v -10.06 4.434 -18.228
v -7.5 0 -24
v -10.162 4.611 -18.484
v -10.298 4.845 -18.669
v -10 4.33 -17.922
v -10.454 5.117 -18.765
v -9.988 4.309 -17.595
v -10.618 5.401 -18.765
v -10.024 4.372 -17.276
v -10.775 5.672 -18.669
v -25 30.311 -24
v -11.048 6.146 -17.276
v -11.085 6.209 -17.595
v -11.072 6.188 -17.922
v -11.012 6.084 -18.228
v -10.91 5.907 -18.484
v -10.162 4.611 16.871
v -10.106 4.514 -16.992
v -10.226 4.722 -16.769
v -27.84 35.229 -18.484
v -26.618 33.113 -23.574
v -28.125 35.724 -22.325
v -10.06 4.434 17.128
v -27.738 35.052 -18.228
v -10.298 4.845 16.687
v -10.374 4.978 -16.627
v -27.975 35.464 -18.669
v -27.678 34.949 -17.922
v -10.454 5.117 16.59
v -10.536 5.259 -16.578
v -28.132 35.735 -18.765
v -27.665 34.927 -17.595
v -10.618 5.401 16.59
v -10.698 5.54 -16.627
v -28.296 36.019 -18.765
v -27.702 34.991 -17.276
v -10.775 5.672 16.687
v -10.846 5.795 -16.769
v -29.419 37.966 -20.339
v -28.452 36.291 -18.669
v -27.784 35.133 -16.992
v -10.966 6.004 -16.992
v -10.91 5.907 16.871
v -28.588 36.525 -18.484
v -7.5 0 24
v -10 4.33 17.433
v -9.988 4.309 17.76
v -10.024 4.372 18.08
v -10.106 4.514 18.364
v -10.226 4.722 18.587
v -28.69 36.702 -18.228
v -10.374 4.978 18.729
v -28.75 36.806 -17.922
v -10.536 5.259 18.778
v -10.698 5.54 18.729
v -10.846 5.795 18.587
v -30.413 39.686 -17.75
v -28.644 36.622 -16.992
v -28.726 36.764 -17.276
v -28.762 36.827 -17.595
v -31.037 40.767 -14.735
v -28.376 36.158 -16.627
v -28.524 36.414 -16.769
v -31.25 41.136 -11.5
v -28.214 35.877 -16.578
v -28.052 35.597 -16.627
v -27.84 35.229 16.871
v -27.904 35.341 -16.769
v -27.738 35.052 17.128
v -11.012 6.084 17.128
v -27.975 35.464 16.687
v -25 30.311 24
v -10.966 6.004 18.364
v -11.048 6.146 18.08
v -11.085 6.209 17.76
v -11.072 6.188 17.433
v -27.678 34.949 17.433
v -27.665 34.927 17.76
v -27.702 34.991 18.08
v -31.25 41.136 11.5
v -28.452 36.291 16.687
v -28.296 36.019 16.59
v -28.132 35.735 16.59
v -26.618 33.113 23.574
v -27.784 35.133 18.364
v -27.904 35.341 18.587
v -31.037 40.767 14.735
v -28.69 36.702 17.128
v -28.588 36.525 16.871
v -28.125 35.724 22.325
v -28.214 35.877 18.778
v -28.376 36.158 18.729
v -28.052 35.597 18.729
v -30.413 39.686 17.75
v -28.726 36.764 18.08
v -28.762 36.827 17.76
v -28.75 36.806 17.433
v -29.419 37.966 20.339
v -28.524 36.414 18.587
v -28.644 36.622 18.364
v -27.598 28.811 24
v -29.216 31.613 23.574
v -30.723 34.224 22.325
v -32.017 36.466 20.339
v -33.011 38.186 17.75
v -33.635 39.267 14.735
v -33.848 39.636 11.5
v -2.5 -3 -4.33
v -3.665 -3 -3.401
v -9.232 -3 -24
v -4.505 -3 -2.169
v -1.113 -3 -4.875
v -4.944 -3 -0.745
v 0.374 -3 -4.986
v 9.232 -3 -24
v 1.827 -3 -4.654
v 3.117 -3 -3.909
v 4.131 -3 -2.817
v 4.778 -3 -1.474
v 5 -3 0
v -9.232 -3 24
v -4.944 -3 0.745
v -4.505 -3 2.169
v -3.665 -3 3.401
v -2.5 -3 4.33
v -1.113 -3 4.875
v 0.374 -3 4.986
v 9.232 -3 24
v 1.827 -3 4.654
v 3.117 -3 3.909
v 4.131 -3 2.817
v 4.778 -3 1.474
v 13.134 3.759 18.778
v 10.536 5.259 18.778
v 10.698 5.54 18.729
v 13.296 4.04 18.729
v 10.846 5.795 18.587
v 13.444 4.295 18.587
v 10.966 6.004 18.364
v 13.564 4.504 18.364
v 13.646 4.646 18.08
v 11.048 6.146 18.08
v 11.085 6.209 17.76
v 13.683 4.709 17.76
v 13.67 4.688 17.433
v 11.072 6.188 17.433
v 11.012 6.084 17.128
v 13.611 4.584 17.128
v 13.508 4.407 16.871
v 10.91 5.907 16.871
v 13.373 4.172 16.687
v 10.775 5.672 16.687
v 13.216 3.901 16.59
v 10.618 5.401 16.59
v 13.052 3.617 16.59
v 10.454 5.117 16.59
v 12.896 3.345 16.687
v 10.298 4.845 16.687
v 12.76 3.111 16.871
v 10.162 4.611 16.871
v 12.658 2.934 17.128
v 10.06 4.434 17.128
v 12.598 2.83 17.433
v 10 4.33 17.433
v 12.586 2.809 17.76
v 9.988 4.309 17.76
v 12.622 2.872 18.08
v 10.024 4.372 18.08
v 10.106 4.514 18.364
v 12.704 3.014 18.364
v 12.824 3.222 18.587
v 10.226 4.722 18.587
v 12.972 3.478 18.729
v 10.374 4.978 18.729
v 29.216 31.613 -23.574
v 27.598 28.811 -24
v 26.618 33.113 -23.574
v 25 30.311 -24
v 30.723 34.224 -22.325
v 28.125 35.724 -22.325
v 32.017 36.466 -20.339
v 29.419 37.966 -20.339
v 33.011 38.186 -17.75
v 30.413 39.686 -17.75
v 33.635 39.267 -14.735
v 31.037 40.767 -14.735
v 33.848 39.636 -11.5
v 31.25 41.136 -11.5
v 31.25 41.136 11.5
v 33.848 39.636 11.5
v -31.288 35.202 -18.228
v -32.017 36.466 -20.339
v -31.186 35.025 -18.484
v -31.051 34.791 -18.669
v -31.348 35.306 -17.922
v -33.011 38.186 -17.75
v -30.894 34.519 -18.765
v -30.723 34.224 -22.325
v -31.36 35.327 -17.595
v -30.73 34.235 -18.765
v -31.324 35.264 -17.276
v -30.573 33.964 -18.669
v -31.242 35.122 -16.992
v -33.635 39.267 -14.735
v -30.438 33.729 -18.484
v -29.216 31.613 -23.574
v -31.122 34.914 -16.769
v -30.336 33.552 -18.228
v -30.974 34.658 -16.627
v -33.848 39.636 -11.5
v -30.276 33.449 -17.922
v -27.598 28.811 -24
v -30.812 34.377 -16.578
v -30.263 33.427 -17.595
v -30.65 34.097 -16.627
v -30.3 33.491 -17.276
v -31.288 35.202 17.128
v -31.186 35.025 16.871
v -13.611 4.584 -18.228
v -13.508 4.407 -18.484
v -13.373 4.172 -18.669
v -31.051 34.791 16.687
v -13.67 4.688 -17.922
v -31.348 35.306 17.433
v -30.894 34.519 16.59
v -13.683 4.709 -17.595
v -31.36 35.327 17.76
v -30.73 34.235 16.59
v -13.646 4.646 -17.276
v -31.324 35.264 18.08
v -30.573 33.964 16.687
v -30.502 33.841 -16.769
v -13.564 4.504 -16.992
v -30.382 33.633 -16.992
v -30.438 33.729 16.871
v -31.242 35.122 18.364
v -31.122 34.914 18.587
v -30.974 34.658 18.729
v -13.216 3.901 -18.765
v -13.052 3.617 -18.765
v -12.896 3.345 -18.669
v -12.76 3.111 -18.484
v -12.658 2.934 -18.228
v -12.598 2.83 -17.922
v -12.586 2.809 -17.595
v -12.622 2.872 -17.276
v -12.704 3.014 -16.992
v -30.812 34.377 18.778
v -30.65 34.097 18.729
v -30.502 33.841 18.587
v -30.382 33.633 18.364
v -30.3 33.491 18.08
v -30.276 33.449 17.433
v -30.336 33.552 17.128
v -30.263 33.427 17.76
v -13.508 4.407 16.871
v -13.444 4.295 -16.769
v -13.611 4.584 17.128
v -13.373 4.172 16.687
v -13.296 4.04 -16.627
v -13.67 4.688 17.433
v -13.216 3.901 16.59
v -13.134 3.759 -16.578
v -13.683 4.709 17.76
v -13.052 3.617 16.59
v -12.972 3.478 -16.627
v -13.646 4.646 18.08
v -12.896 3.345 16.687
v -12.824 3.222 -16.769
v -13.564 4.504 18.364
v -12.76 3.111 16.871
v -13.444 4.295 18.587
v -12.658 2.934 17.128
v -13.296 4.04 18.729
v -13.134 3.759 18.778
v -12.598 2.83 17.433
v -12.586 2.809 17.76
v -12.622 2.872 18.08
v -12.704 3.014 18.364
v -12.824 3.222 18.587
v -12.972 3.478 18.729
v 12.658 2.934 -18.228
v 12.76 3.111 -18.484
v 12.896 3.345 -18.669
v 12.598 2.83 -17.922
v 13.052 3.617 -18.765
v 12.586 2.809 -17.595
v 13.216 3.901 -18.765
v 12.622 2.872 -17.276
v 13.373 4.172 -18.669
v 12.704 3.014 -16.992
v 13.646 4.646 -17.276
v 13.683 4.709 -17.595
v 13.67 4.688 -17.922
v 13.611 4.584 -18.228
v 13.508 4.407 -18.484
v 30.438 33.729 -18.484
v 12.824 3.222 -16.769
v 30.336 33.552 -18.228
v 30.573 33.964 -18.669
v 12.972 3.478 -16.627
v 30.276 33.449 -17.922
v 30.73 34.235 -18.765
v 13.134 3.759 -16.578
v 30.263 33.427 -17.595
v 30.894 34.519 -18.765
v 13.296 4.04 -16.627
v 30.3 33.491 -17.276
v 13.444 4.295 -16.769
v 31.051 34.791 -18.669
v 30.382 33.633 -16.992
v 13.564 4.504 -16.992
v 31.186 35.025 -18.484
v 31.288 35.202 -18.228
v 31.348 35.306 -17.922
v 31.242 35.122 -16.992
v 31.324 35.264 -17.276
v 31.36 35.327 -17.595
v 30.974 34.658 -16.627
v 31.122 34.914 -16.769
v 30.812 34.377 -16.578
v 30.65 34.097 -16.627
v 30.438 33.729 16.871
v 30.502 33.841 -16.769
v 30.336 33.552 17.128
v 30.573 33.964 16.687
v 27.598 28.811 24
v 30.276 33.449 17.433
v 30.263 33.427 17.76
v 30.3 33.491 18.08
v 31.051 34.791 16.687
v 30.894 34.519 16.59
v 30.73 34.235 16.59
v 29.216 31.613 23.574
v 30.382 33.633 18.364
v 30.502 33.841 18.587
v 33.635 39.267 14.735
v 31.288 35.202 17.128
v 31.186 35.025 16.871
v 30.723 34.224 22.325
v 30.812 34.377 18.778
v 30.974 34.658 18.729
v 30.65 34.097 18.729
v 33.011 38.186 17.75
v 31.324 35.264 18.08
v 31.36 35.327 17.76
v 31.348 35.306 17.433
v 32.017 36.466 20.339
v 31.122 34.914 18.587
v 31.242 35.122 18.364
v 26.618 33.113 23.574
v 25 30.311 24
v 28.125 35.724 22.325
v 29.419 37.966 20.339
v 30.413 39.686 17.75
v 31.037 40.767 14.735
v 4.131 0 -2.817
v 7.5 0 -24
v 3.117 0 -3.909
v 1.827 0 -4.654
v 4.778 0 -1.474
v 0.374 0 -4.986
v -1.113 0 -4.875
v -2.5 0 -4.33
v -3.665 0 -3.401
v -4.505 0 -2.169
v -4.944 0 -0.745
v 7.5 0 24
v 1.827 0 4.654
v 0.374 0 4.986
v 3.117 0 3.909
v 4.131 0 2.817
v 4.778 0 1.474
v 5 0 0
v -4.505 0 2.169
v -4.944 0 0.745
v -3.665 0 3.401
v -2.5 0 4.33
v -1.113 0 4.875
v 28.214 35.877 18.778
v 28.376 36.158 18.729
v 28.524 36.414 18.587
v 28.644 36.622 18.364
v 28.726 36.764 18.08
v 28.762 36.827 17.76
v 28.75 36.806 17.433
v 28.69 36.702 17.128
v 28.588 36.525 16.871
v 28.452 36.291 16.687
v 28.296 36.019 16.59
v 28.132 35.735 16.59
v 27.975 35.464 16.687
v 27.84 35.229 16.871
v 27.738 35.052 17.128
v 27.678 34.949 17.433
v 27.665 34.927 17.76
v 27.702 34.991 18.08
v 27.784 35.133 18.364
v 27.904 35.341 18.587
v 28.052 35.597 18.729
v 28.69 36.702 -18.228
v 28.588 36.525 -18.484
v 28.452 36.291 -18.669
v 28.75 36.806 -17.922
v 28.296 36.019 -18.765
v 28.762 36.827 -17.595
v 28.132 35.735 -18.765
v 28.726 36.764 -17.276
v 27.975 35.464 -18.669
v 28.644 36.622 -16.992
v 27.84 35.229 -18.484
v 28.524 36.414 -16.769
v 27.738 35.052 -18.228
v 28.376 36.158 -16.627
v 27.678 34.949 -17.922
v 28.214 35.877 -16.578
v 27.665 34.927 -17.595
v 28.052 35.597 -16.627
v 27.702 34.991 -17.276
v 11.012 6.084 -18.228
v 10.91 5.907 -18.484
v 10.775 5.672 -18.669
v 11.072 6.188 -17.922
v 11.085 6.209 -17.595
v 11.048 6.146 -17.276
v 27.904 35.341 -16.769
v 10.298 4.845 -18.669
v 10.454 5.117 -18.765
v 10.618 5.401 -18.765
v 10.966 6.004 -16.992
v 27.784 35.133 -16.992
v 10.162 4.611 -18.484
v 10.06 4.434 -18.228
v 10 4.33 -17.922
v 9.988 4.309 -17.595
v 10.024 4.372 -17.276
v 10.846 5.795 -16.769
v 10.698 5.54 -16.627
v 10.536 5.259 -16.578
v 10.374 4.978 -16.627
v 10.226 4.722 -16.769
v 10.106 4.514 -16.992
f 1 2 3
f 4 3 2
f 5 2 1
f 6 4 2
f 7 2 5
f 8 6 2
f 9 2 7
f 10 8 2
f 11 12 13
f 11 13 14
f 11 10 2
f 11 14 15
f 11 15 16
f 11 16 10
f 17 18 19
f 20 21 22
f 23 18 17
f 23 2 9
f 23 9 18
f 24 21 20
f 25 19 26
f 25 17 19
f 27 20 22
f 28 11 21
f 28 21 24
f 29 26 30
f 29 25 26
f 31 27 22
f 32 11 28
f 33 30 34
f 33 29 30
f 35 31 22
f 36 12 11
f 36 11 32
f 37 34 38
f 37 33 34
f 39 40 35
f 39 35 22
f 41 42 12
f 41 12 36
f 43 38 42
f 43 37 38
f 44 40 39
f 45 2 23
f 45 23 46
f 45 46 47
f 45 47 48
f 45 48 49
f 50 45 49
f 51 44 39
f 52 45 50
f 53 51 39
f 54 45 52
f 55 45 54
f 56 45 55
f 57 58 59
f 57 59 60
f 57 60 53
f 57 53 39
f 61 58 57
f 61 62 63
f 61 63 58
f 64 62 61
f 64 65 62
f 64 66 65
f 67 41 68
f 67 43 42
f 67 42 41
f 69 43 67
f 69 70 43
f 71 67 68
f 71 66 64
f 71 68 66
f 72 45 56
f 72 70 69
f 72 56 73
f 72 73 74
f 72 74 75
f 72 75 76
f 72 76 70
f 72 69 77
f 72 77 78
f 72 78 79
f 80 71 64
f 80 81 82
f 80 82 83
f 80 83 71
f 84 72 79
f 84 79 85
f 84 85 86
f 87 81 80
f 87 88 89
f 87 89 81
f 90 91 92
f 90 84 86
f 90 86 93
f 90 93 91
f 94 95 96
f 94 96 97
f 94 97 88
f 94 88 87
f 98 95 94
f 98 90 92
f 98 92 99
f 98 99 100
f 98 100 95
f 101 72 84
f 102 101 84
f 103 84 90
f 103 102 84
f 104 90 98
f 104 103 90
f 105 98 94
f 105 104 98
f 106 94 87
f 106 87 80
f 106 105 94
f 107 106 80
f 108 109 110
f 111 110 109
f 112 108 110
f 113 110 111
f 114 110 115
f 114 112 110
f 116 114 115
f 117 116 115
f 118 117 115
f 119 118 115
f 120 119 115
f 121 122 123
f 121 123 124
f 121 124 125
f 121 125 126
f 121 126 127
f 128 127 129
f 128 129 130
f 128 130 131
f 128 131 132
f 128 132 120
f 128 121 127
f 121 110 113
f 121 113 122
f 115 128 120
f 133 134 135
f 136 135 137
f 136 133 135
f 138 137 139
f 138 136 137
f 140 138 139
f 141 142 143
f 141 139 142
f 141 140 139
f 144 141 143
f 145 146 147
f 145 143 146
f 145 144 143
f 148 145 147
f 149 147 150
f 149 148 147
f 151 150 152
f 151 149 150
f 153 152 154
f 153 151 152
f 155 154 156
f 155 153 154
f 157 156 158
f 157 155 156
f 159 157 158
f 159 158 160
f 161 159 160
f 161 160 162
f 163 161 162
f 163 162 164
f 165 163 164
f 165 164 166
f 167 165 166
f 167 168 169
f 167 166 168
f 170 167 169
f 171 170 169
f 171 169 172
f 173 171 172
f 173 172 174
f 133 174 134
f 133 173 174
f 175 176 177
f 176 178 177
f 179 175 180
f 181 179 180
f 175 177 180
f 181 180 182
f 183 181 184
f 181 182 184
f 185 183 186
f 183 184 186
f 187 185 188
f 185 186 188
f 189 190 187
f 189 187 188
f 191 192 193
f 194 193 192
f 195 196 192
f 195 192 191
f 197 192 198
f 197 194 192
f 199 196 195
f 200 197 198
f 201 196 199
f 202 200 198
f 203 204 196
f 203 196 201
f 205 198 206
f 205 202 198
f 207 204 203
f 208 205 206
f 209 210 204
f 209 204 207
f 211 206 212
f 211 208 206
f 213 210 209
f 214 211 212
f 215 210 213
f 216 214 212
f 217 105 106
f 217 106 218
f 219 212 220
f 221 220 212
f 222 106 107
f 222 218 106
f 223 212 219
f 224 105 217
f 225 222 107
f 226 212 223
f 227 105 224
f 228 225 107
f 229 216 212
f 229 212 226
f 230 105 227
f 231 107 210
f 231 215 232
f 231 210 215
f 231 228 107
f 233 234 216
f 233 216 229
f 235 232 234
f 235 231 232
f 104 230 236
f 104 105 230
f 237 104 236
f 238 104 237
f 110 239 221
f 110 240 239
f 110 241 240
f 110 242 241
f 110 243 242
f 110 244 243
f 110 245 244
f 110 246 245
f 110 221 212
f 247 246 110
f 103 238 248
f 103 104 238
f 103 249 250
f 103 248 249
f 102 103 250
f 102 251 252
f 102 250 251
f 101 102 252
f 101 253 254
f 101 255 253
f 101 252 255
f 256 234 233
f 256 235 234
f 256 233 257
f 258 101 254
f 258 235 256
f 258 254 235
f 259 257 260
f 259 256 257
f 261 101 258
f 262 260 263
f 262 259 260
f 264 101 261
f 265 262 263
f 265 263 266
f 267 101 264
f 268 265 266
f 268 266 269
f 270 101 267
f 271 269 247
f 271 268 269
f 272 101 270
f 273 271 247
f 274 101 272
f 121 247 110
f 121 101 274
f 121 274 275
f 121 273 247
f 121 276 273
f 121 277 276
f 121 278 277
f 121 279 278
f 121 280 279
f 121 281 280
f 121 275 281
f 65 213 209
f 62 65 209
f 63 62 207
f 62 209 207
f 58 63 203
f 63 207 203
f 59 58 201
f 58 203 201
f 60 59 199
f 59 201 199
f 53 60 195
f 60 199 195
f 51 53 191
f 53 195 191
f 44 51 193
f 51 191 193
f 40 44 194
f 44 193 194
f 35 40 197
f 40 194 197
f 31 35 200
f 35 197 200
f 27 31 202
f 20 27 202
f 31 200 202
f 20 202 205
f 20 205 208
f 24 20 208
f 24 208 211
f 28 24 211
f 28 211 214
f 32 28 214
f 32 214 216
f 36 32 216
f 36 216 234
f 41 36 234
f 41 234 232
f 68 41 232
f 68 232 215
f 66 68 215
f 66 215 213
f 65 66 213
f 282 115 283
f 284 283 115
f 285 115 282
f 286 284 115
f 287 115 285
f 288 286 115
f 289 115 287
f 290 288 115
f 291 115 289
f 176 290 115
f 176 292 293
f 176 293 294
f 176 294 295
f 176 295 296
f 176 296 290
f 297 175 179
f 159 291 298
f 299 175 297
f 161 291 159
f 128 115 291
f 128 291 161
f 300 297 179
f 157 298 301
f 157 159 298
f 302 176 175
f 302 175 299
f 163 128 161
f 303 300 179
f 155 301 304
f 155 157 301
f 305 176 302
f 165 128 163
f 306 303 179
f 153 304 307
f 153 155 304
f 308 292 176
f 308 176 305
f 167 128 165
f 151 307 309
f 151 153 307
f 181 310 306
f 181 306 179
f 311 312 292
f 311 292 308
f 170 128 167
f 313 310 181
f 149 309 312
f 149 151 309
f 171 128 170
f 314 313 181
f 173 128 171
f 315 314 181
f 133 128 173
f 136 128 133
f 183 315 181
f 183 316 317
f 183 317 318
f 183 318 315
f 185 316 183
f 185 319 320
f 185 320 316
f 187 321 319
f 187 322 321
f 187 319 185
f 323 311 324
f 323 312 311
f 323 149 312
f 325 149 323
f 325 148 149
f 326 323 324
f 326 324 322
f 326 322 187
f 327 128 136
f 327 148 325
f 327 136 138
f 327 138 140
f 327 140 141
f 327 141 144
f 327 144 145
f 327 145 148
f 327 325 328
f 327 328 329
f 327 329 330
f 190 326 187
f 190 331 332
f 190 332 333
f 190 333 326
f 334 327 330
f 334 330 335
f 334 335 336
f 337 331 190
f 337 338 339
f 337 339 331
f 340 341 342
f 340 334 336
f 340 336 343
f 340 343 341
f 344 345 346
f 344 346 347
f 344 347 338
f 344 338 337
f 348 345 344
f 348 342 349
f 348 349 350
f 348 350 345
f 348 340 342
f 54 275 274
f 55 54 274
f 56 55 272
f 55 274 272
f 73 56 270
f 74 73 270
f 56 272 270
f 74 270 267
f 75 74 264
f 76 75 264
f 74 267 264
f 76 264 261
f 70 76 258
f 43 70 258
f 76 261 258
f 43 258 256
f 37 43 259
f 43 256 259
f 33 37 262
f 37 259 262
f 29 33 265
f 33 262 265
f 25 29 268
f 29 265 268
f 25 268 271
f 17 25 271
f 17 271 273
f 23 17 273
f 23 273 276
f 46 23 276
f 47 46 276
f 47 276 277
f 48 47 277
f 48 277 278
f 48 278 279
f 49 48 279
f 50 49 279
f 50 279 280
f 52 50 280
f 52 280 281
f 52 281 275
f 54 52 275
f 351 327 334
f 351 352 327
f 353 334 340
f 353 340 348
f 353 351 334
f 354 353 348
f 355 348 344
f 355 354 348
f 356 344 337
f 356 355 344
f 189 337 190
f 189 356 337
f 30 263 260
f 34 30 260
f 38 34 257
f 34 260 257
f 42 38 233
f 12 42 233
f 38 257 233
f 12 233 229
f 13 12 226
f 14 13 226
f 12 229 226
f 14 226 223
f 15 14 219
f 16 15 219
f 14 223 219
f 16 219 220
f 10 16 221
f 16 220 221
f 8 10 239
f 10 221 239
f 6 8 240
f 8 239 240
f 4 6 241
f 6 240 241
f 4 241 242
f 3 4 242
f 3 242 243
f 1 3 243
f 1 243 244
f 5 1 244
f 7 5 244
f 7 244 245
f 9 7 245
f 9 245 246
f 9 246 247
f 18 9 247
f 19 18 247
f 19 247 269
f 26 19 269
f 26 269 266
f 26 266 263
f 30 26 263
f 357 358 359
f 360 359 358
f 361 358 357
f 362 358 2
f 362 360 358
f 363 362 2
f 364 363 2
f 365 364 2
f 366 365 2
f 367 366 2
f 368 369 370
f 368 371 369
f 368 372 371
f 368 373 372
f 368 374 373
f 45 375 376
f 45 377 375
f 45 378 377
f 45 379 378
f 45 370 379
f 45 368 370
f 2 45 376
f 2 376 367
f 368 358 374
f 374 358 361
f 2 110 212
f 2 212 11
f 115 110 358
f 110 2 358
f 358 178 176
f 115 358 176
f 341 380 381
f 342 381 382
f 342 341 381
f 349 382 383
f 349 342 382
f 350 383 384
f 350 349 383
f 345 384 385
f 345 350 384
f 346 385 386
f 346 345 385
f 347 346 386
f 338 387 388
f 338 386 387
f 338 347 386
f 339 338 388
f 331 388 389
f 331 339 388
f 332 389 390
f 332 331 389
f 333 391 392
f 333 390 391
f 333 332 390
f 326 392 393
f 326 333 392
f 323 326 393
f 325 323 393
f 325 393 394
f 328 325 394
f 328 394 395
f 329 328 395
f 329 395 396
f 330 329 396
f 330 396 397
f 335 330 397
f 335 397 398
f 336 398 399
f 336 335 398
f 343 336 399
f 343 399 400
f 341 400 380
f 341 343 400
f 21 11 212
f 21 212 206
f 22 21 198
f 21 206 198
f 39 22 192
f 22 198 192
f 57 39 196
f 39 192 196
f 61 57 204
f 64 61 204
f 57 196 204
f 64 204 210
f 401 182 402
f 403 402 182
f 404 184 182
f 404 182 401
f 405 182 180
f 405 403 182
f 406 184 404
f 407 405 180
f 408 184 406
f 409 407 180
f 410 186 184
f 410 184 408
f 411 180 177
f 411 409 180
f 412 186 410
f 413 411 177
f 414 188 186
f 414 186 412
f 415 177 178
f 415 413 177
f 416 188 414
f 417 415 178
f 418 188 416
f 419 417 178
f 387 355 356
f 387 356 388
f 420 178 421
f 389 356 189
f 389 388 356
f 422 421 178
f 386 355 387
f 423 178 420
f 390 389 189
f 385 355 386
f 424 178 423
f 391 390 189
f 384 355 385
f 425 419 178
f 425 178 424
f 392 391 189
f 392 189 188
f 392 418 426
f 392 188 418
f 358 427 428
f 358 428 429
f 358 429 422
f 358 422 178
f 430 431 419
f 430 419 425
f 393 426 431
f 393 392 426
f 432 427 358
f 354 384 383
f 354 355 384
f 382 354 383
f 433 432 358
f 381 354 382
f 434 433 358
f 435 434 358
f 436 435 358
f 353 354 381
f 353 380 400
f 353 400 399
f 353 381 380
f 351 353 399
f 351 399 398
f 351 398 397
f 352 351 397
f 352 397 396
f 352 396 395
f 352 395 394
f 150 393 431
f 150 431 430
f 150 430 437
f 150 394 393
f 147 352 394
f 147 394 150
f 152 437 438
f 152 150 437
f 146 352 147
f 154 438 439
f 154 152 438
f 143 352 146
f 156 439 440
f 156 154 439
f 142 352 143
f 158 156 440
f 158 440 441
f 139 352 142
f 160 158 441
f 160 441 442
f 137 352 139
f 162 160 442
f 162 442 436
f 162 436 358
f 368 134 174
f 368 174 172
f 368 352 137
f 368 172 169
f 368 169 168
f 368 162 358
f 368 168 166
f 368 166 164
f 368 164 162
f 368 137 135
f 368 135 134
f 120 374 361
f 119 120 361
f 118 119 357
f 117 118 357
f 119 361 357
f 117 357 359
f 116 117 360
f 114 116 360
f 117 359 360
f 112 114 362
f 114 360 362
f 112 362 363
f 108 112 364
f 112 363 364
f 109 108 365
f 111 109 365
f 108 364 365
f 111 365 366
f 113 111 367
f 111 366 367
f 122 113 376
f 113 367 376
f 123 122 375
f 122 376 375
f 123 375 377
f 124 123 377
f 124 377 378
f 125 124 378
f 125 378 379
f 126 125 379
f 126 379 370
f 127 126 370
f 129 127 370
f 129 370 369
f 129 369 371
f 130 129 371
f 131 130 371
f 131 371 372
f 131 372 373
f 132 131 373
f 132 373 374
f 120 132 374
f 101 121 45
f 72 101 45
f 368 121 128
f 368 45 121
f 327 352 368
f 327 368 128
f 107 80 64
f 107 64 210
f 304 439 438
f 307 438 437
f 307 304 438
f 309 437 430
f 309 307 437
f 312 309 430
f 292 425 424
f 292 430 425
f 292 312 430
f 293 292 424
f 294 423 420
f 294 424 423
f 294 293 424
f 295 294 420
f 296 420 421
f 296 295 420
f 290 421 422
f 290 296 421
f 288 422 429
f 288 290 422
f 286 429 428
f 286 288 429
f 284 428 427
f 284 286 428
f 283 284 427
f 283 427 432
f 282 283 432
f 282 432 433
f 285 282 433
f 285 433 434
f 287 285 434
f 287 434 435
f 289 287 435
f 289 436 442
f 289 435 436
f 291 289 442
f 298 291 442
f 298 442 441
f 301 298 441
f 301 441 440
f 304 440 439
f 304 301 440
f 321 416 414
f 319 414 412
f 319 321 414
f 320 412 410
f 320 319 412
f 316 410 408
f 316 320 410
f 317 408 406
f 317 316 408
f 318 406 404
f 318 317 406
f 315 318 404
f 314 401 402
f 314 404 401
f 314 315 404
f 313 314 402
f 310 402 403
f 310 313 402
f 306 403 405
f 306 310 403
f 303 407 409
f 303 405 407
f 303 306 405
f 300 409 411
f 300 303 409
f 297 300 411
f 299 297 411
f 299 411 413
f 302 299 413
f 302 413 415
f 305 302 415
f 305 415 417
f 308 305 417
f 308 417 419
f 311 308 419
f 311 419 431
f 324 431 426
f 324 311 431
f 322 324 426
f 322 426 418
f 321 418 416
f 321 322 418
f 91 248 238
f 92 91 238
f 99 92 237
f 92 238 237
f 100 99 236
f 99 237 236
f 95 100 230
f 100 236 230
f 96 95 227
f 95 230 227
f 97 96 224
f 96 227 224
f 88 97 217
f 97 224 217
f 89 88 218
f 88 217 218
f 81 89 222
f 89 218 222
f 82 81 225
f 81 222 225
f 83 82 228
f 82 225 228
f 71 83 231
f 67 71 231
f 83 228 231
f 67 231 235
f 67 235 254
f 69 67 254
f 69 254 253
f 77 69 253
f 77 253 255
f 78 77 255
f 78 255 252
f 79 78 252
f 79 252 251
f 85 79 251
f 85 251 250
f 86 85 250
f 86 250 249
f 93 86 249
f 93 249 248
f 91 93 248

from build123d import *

# Parameters (mm, degrees)
BOSS_EXTRU_1_DEPTH      = 48
BOSS_EXTRU_1_DEPTH_BACK = 48
ESQUISSE2_R             = 2.2
ENL_V_MAT_EXTRU_1_DEPTH = 10
CONG_1_R                = 25
ECHELLE1_SCALE          = 0.5
ESQUISSE3_R             = 5
ENL_V_MAT_EXTRU_2_DEPTH = 10


with BuildPart() as part:
    # Esquisse1 → Boss.-Extru.1 (new, two sides: drawn at the far end of the back side and taken through both)
    with BuildSketch(Plane.XY.offset(-BOSS_EXTRU_1_DEPTH_BACK)):
        Polygon((15, 0), (-15, 0), (-62.5, 82.27241336), (-67.696152423, 79.27241336), (-18.464101615, -6), (18.464101615, -6), (67.696152423, 79.27241336), (62.5, 82.27241336), align=None)
    extrude(amount=BOSS_EXTRU_1_DEPTH + BOSS_EXTRU_1_DEPTH_BACK)

    # Esquisse2 → Enlèv. mat.-Extru.1 (cut)
    with BuildSketch(Plane(origin=(-16.446152423, -9.495190528, 0), x_dir=(0, 0, 1), z_dir=(-0.8660254037844378, -0.5000000000000016, 0))):
        with Locations((-35.355339059, 19.644660941)):
            Circle(ESQUISSE2_R)
        with Locations((35.355339059, 90.355339059)):
            Circle(ESQUISSE2_R)
        with Locations((35.355339059, 19.644660941)):
            Circle(ESQUISSE2_R)
        with Locations((-35.355339059, 90.355339059)):
            Circle(ESQUISSE2_R)
    enl_v_mat_extru_1 = extrude(amount=-ENL_V_MAT_EXTRU_1_DEPTH, mode=Mode.SUBTRACT)

    # Congé1
    cong_1_edges = [part.edges().sort_by_distance(p)[0] for p in [
        (65.098076211, 80.77241336, 48),
        (65.098076211, 80.77241336, -48),
        (-65.098076211, 80.77241336, -48),
        (-65.098076211, 80.77241336, 48),
    ]]
    fillet(cong_1_edges, radius=CONG_1_R)

    # Symétrie1: Enlèv. mat.-Extru.1 across plane
    add(enl_v_mat_extru_1.mirror(Plane(origin=(0, 0, 0), x_dir=(0, 0, 1), z_dir=(1, 0, 0))), mode=Mode.SUBTRACT)


with BuildPart() as part_1:
    # Echelle1: scaled about (0, 0, 0)
    add(part.part.scale(ECHELLE1_SCALE))

    # Esquisse3 → Enlèv. mat.-Extru.2 (cut)
    with BuildSketch(Plane(origin=(0, 0, 0), x_dir=(1, 0, 0), z_dir=(0, 1, 0))):
        Circle(ESQUISSE3_R)
    extrude(amount=-ENL_V_MAT_EXTRU_2_DEPTH, mode=Mode.SUBTRACT)


solid = part_1.part
